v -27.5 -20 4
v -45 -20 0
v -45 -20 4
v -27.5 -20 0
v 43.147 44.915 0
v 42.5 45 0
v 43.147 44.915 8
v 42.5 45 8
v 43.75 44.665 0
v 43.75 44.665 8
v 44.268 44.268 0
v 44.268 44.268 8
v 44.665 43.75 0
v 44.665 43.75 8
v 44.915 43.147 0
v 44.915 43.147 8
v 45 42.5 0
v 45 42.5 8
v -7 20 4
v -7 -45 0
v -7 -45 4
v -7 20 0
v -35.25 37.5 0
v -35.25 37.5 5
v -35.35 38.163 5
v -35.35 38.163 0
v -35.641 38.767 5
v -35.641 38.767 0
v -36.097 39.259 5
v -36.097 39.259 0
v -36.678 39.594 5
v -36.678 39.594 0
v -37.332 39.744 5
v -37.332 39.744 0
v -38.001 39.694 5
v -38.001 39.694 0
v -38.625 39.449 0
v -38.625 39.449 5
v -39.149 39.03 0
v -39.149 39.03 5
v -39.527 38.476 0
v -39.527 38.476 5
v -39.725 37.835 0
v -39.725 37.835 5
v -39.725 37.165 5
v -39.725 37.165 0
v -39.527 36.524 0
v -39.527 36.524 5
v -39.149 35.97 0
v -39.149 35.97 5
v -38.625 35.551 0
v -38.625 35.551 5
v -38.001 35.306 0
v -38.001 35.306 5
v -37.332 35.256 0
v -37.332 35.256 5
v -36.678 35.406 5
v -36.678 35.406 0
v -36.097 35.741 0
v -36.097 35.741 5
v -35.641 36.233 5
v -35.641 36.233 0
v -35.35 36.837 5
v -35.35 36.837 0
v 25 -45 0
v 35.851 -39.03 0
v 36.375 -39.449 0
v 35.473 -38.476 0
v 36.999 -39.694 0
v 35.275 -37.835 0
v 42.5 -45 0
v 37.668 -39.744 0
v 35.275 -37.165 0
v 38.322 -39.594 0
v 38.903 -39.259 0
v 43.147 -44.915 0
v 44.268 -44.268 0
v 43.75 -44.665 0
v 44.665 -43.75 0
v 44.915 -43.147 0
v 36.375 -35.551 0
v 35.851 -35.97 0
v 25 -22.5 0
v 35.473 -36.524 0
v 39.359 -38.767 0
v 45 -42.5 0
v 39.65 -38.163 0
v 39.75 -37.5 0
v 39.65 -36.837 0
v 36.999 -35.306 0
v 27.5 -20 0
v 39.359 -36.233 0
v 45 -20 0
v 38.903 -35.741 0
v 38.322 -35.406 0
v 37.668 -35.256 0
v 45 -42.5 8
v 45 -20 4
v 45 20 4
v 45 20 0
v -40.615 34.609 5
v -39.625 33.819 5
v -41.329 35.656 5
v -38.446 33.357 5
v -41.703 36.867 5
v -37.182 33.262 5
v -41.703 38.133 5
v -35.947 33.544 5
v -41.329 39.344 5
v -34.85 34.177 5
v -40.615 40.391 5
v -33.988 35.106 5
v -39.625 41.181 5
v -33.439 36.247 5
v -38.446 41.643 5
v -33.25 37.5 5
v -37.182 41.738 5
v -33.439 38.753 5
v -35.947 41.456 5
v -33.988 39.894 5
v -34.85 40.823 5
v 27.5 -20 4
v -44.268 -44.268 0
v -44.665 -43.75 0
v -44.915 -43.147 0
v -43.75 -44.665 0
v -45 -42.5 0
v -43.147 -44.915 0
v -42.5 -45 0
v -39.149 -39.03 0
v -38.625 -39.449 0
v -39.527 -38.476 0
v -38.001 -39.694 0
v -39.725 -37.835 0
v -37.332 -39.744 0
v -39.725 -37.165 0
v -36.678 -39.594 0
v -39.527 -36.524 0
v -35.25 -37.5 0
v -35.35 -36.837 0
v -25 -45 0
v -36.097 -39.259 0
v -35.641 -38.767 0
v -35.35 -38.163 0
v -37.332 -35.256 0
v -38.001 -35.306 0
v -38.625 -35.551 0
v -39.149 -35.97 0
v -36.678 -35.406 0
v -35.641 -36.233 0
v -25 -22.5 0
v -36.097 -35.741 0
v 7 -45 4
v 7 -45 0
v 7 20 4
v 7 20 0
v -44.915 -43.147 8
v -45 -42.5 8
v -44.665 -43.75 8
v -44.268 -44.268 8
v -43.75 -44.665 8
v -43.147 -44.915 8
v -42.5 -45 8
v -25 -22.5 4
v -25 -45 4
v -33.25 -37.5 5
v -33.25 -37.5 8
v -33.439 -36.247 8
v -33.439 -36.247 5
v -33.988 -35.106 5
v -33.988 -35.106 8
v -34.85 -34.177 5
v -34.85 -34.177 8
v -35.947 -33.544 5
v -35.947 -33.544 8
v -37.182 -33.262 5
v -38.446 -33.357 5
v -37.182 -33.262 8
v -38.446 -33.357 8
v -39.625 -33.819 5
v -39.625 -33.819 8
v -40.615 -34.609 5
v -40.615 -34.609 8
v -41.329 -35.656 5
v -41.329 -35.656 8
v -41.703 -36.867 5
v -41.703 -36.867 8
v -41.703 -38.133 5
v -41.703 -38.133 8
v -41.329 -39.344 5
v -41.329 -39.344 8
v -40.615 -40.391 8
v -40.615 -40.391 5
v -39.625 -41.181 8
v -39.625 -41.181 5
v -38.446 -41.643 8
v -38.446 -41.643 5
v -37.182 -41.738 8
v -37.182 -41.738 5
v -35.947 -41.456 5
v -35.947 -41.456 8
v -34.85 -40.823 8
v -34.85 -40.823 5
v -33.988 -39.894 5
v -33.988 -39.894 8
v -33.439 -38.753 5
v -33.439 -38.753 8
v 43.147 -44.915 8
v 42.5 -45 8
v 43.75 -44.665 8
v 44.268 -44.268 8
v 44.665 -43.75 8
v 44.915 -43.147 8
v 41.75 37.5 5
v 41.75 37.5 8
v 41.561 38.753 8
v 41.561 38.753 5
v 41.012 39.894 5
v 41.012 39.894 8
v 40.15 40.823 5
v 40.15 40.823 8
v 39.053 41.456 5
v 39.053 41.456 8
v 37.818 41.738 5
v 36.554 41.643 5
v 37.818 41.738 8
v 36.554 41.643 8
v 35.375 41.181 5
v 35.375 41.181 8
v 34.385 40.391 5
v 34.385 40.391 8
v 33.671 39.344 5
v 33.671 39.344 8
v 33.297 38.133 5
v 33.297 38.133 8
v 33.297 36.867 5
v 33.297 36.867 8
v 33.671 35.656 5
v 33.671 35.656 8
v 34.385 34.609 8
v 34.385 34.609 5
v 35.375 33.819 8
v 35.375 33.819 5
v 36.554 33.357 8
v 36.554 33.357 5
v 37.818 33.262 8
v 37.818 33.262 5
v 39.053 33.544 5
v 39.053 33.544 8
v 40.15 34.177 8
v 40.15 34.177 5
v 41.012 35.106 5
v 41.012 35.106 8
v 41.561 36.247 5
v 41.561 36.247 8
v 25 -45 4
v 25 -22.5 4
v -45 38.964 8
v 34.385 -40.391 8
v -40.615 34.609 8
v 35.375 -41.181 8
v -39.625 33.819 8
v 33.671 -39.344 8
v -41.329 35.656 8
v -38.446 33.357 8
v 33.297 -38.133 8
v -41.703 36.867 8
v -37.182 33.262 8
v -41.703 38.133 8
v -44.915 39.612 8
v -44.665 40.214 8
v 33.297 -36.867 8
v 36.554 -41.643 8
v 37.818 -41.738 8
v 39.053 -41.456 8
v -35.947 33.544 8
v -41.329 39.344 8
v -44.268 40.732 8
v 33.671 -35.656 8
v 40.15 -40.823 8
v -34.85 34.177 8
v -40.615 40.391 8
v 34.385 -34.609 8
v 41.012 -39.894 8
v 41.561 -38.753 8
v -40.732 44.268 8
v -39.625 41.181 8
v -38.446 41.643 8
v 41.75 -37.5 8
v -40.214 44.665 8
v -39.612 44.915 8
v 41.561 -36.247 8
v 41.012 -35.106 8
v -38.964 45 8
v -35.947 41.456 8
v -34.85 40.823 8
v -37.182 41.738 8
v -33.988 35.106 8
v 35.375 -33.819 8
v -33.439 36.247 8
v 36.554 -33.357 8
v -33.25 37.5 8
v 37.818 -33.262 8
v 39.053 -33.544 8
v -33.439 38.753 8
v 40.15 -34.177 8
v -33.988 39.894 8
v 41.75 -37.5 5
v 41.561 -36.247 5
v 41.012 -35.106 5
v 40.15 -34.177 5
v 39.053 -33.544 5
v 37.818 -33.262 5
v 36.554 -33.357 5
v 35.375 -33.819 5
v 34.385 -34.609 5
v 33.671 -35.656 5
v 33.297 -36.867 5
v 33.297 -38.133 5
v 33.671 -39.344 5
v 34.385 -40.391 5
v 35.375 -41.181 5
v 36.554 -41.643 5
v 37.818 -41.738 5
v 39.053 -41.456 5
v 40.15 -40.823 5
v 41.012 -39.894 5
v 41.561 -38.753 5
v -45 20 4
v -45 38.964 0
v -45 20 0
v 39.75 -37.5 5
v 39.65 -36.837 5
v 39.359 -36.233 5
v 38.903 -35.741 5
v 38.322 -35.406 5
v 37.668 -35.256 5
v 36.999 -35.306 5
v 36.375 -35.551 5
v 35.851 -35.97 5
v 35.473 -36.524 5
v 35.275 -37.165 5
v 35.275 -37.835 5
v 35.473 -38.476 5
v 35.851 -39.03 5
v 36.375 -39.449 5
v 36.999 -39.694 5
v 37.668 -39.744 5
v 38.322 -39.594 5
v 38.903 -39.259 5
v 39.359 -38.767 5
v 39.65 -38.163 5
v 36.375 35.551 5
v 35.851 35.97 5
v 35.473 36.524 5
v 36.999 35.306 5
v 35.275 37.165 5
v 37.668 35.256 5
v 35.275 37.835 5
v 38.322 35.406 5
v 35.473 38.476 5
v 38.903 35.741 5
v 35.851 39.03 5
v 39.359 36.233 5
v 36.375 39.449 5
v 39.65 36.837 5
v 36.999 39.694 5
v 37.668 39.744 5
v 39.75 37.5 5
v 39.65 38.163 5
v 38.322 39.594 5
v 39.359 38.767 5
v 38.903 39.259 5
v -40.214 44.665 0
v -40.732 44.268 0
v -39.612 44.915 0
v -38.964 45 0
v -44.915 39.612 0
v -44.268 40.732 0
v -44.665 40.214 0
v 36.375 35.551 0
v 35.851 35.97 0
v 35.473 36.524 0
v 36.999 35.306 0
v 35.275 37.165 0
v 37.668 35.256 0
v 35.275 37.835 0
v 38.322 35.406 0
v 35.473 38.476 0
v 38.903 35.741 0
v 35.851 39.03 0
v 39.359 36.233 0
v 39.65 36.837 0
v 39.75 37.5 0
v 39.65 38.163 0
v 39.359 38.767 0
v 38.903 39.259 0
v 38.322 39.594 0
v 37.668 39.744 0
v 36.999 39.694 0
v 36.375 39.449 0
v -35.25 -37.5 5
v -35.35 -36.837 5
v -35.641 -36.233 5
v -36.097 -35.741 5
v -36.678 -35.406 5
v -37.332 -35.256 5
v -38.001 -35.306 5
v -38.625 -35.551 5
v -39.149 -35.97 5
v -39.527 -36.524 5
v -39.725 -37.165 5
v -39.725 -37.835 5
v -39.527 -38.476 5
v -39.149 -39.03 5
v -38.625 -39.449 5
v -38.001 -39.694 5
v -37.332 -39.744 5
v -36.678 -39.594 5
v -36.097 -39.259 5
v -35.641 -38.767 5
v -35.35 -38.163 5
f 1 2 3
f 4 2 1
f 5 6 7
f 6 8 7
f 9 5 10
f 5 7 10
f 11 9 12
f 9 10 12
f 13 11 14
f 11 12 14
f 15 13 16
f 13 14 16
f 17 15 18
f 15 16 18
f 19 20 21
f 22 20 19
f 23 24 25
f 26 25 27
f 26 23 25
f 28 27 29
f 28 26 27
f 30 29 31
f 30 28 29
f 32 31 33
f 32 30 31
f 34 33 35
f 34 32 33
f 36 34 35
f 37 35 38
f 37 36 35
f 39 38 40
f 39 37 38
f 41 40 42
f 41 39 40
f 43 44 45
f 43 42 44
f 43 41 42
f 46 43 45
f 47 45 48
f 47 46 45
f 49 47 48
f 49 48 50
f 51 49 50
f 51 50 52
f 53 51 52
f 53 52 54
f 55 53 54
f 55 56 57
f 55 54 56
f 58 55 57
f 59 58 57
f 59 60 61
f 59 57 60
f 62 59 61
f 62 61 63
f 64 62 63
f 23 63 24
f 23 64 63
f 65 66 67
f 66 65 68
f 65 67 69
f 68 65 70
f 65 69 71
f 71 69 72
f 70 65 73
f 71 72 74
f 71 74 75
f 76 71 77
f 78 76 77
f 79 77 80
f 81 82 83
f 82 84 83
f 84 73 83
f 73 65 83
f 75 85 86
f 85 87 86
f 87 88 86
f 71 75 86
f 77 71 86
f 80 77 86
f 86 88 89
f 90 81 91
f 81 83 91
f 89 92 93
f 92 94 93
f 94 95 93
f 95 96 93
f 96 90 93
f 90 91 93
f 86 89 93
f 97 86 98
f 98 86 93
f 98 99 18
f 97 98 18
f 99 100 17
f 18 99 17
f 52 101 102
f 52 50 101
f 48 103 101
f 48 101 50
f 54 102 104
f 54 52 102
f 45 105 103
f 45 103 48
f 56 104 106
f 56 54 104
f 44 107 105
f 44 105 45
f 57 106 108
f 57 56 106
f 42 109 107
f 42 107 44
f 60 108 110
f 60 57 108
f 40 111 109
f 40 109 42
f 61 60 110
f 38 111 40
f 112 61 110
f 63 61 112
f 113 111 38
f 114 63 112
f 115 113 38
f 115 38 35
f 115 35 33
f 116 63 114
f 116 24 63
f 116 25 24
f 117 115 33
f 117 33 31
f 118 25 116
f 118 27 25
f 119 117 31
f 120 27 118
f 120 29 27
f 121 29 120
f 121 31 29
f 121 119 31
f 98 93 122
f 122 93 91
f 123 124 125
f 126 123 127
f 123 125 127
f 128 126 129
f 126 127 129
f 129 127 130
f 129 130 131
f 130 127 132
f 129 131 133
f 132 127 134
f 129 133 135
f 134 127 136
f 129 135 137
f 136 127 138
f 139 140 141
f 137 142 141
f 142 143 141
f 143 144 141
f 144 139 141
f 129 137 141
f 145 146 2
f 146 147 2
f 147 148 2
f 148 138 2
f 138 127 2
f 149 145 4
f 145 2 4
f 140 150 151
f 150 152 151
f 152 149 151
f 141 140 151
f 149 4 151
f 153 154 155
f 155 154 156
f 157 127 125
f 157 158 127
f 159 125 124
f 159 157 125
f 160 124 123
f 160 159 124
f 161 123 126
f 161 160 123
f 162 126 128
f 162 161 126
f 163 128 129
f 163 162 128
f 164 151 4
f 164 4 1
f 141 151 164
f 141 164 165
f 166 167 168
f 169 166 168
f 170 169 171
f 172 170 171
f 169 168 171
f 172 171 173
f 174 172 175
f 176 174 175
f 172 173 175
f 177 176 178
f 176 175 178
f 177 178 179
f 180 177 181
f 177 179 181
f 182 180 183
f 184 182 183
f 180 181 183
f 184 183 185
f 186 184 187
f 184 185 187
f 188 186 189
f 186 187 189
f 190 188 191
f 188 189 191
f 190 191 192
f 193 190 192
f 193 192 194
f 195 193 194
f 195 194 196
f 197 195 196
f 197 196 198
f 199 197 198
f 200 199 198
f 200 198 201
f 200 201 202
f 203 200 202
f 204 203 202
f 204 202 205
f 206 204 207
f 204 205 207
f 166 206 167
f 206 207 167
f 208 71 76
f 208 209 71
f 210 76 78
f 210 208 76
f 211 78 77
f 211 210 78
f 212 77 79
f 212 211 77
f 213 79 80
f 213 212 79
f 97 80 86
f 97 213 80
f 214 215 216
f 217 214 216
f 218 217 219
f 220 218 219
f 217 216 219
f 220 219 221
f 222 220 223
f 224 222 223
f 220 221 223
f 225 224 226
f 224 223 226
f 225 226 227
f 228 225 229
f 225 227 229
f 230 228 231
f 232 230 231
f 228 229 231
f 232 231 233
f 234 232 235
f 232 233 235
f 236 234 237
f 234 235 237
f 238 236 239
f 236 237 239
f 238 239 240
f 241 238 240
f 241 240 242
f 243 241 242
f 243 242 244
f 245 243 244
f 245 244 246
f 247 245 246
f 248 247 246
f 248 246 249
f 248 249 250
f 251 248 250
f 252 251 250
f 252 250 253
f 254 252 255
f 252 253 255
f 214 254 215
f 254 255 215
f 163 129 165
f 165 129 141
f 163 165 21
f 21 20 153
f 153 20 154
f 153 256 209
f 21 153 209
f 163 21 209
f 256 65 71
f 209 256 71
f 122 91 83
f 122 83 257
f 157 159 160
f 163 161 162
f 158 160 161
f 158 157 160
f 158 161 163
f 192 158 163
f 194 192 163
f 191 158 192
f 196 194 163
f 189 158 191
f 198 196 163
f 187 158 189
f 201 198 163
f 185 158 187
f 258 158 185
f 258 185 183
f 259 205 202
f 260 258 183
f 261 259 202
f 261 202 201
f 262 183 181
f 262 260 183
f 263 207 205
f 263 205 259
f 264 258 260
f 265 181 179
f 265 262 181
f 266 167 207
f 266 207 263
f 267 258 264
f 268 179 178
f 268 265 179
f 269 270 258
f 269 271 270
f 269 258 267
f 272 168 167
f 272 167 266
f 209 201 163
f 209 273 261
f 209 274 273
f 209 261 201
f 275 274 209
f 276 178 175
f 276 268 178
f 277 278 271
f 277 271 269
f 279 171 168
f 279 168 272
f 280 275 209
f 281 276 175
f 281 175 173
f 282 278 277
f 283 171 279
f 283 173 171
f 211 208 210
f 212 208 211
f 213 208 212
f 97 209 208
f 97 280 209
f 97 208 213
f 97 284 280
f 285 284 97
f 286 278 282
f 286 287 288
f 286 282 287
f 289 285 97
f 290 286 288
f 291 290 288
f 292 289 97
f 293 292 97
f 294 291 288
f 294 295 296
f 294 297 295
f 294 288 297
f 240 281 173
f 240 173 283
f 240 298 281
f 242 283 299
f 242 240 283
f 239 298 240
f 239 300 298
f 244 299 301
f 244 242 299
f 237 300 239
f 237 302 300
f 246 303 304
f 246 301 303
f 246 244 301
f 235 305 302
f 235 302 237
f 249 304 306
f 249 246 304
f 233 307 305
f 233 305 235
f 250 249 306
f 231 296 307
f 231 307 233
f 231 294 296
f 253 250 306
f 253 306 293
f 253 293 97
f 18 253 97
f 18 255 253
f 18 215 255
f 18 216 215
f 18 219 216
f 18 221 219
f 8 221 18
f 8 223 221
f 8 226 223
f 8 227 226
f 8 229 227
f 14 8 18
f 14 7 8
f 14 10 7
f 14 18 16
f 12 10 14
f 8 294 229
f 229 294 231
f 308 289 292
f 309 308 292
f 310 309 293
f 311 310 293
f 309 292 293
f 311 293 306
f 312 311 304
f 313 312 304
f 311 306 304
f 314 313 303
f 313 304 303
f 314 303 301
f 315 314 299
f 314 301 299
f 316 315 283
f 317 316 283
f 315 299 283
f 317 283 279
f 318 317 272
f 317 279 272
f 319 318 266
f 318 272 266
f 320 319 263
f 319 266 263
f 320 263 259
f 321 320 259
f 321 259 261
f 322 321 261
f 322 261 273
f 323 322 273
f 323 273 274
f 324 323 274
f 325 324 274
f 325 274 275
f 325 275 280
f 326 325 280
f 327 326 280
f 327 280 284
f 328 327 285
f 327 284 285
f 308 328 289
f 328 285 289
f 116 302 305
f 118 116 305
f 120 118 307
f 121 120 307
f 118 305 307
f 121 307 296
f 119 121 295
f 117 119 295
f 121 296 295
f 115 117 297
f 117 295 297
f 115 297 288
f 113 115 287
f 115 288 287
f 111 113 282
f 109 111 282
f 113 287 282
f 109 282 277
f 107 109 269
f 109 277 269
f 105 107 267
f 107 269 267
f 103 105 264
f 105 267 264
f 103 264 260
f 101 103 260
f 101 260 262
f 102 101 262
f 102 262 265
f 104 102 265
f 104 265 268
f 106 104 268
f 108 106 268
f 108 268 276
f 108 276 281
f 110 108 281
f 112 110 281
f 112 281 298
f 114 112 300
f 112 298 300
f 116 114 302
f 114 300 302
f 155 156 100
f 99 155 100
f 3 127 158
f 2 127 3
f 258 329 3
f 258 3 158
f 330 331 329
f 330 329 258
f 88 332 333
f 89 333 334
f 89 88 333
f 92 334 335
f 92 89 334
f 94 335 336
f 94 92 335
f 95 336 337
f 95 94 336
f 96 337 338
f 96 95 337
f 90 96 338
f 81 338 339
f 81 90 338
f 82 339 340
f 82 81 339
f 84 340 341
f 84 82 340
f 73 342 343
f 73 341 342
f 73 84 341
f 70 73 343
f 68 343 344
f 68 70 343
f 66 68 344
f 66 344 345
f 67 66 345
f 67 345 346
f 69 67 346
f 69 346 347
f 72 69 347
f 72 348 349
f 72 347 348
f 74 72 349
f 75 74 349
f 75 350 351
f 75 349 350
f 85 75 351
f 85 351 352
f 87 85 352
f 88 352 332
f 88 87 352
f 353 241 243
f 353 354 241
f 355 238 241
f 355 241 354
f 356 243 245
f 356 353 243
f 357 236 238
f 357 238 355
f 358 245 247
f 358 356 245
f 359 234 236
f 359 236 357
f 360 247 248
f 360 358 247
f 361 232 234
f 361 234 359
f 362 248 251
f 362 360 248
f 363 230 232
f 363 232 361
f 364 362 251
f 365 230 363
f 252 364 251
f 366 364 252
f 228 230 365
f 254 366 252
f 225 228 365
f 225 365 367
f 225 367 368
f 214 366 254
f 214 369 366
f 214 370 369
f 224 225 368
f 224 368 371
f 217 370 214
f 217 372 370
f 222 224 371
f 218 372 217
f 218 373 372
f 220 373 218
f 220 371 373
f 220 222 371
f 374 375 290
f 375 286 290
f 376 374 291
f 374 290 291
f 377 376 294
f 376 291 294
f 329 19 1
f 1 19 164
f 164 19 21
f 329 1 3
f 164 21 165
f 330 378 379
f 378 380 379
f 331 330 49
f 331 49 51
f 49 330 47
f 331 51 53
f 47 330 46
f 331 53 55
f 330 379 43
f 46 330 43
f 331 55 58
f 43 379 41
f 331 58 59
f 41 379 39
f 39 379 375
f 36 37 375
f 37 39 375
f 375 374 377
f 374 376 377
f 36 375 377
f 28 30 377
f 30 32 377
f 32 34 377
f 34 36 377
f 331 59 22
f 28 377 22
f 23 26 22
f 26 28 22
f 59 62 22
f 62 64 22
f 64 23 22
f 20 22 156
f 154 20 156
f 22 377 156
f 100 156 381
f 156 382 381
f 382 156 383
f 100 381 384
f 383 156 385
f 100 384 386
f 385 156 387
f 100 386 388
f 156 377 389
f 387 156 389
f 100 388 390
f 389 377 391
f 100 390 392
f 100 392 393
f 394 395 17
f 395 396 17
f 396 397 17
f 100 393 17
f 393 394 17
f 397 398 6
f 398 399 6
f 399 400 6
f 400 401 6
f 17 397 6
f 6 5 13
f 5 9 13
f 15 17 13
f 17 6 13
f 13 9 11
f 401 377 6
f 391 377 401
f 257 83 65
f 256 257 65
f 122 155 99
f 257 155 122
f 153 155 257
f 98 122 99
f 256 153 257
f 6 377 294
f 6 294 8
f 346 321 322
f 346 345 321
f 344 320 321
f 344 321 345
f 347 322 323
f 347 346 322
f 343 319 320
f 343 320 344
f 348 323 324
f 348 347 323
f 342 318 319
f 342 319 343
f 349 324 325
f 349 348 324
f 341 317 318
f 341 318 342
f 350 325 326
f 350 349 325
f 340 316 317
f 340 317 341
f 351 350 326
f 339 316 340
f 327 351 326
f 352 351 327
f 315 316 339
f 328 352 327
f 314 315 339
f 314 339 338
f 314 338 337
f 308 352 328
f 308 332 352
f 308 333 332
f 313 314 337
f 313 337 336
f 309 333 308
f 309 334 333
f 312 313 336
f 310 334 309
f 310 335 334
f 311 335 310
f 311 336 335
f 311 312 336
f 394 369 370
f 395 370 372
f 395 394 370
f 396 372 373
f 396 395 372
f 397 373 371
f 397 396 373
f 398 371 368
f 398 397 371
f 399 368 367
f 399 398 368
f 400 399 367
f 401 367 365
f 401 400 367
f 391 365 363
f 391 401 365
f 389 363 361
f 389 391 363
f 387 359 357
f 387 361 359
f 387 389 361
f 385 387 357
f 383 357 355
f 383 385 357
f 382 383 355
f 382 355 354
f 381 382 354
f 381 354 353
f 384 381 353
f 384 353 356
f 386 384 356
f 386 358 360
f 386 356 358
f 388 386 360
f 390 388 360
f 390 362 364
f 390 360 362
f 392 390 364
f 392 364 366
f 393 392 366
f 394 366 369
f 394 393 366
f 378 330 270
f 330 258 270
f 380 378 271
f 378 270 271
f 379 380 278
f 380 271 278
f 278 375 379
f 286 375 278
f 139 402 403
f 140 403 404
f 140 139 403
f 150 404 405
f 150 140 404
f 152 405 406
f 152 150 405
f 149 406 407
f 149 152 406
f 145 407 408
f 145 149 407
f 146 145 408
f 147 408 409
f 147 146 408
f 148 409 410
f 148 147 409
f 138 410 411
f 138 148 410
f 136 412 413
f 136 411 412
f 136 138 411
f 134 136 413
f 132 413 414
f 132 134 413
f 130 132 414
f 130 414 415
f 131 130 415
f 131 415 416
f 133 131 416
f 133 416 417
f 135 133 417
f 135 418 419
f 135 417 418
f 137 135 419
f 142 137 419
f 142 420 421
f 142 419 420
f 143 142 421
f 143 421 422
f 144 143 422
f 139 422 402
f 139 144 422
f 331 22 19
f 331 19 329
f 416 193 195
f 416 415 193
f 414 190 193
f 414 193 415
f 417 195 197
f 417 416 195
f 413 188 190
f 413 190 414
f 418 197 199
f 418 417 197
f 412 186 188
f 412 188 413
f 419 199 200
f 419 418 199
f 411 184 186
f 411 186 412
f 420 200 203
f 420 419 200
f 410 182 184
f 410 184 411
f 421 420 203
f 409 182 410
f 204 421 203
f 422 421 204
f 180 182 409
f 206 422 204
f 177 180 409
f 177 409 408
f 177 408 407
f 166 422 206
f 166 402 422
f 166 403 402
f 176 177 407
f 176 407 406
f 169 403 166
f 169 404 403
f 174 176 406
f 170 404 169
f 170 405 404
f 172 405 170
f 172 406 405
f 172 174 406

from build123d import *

# Parameters (mm, degrees)
SKETCH_W        = 90
SKETCH_H        = 90
SKETCH_R        = 2.25
PAD_DEPTH       = 8
SKETCH001_R     = 4.25
POCKET_DEPTH    = 3
CHAMFER_SIZE    = 5
POCKET001_DEPTH = 4
FILLET_R        = 2.5
CHAMFER001_SIZE = 2.5


with BuildPart() as part:
    # Sketch → Pad (new body)
    with BuildSketch(Plane.XY):
        Rectangle(SKETCH_W, SKETCH_H)
        with Locations((-37.5, 37.5)):
            Circle(SKETCH_R, mode=Mode.SUBTRACT)
        with Locations((37.5, 37.5)):
            Circle(SKETCH_R, mode=Mode.SUBTRACT)
        with Locations((-37.5, -37.5)):
            Circle(SKETCH_R, mode=Mode.SUBTRACT)
        with Locations((37.5, -37.5)):
            Circle(SKETCH_R, mode=Mode.SUBTRACT)
    extrude(amount=PAD_DEPTH)

    # Sketch001 (on Face10 of Pad) → Pocket (cut)
    with BuildSketch(Plane.XY.offset(8)):
        with Locations((-37.5, 37.5)):
            Circle(SKETCH001_R)
        with Locations((37.5, 37.5)):
            Circle(SKETCH001_R)
        with Locations((-37.5, -37.5)):
            Circle(SKETCH001_R)
        with Locations((37.5, -37.5)):
            Circle(SKETCH001_R)
    extrude(amount=-POCKET_DEPTH, mode=Mode.SUBTRACT)

    # Chamfer
    chamfer_edges = [part.edges().sort_by_distance(p)[0] for p in [
        (-45, 45, 4),
    ]]
    chamfer(chamfer_edges, length=CHAMFER_SIZE)

    # Sketch002 (on Face2 of Chamfer) → Pocket001 (cut)
    with BuildSketch(Plane(origin=(0, 0, 0), x_dir=(1, 0, 0), z_dir=(0, 0, -1))):
        Polygon((-45, 20), (-25, 20), (-25, 45), (-7, 45), (-7, -20), (-45, -20), align=None)
        Polygon((45, 20), (25, 20), (25, 45), (7, 45), (7, -20), (45, -20), align=None)
    extrude(amount=-POCKET001_DEPTH, mode=Mode.SUBTRACT)

    # Fillet
    fillet_edges = [part.edges().sort_by_distance(p)[0] for p in [
        (45, -45, 4),
        (45, 45, 4),
        (-45, -45, 4),
        (-40, 45, 4),
        (-45, 40, 4),
    ]]
    fillet(fillet_edges, radius=FILLET_R)

    # Chamfer001
    chamfer001_edges = [part.edges().sort_by_distance(p)[0] for p in [
        (25, -20, 2),
        (-25, -20, 2),
    ]]
    chamfer(chamfer001_edges, length=CHAMFER001_SIZE)


solid = part.part
